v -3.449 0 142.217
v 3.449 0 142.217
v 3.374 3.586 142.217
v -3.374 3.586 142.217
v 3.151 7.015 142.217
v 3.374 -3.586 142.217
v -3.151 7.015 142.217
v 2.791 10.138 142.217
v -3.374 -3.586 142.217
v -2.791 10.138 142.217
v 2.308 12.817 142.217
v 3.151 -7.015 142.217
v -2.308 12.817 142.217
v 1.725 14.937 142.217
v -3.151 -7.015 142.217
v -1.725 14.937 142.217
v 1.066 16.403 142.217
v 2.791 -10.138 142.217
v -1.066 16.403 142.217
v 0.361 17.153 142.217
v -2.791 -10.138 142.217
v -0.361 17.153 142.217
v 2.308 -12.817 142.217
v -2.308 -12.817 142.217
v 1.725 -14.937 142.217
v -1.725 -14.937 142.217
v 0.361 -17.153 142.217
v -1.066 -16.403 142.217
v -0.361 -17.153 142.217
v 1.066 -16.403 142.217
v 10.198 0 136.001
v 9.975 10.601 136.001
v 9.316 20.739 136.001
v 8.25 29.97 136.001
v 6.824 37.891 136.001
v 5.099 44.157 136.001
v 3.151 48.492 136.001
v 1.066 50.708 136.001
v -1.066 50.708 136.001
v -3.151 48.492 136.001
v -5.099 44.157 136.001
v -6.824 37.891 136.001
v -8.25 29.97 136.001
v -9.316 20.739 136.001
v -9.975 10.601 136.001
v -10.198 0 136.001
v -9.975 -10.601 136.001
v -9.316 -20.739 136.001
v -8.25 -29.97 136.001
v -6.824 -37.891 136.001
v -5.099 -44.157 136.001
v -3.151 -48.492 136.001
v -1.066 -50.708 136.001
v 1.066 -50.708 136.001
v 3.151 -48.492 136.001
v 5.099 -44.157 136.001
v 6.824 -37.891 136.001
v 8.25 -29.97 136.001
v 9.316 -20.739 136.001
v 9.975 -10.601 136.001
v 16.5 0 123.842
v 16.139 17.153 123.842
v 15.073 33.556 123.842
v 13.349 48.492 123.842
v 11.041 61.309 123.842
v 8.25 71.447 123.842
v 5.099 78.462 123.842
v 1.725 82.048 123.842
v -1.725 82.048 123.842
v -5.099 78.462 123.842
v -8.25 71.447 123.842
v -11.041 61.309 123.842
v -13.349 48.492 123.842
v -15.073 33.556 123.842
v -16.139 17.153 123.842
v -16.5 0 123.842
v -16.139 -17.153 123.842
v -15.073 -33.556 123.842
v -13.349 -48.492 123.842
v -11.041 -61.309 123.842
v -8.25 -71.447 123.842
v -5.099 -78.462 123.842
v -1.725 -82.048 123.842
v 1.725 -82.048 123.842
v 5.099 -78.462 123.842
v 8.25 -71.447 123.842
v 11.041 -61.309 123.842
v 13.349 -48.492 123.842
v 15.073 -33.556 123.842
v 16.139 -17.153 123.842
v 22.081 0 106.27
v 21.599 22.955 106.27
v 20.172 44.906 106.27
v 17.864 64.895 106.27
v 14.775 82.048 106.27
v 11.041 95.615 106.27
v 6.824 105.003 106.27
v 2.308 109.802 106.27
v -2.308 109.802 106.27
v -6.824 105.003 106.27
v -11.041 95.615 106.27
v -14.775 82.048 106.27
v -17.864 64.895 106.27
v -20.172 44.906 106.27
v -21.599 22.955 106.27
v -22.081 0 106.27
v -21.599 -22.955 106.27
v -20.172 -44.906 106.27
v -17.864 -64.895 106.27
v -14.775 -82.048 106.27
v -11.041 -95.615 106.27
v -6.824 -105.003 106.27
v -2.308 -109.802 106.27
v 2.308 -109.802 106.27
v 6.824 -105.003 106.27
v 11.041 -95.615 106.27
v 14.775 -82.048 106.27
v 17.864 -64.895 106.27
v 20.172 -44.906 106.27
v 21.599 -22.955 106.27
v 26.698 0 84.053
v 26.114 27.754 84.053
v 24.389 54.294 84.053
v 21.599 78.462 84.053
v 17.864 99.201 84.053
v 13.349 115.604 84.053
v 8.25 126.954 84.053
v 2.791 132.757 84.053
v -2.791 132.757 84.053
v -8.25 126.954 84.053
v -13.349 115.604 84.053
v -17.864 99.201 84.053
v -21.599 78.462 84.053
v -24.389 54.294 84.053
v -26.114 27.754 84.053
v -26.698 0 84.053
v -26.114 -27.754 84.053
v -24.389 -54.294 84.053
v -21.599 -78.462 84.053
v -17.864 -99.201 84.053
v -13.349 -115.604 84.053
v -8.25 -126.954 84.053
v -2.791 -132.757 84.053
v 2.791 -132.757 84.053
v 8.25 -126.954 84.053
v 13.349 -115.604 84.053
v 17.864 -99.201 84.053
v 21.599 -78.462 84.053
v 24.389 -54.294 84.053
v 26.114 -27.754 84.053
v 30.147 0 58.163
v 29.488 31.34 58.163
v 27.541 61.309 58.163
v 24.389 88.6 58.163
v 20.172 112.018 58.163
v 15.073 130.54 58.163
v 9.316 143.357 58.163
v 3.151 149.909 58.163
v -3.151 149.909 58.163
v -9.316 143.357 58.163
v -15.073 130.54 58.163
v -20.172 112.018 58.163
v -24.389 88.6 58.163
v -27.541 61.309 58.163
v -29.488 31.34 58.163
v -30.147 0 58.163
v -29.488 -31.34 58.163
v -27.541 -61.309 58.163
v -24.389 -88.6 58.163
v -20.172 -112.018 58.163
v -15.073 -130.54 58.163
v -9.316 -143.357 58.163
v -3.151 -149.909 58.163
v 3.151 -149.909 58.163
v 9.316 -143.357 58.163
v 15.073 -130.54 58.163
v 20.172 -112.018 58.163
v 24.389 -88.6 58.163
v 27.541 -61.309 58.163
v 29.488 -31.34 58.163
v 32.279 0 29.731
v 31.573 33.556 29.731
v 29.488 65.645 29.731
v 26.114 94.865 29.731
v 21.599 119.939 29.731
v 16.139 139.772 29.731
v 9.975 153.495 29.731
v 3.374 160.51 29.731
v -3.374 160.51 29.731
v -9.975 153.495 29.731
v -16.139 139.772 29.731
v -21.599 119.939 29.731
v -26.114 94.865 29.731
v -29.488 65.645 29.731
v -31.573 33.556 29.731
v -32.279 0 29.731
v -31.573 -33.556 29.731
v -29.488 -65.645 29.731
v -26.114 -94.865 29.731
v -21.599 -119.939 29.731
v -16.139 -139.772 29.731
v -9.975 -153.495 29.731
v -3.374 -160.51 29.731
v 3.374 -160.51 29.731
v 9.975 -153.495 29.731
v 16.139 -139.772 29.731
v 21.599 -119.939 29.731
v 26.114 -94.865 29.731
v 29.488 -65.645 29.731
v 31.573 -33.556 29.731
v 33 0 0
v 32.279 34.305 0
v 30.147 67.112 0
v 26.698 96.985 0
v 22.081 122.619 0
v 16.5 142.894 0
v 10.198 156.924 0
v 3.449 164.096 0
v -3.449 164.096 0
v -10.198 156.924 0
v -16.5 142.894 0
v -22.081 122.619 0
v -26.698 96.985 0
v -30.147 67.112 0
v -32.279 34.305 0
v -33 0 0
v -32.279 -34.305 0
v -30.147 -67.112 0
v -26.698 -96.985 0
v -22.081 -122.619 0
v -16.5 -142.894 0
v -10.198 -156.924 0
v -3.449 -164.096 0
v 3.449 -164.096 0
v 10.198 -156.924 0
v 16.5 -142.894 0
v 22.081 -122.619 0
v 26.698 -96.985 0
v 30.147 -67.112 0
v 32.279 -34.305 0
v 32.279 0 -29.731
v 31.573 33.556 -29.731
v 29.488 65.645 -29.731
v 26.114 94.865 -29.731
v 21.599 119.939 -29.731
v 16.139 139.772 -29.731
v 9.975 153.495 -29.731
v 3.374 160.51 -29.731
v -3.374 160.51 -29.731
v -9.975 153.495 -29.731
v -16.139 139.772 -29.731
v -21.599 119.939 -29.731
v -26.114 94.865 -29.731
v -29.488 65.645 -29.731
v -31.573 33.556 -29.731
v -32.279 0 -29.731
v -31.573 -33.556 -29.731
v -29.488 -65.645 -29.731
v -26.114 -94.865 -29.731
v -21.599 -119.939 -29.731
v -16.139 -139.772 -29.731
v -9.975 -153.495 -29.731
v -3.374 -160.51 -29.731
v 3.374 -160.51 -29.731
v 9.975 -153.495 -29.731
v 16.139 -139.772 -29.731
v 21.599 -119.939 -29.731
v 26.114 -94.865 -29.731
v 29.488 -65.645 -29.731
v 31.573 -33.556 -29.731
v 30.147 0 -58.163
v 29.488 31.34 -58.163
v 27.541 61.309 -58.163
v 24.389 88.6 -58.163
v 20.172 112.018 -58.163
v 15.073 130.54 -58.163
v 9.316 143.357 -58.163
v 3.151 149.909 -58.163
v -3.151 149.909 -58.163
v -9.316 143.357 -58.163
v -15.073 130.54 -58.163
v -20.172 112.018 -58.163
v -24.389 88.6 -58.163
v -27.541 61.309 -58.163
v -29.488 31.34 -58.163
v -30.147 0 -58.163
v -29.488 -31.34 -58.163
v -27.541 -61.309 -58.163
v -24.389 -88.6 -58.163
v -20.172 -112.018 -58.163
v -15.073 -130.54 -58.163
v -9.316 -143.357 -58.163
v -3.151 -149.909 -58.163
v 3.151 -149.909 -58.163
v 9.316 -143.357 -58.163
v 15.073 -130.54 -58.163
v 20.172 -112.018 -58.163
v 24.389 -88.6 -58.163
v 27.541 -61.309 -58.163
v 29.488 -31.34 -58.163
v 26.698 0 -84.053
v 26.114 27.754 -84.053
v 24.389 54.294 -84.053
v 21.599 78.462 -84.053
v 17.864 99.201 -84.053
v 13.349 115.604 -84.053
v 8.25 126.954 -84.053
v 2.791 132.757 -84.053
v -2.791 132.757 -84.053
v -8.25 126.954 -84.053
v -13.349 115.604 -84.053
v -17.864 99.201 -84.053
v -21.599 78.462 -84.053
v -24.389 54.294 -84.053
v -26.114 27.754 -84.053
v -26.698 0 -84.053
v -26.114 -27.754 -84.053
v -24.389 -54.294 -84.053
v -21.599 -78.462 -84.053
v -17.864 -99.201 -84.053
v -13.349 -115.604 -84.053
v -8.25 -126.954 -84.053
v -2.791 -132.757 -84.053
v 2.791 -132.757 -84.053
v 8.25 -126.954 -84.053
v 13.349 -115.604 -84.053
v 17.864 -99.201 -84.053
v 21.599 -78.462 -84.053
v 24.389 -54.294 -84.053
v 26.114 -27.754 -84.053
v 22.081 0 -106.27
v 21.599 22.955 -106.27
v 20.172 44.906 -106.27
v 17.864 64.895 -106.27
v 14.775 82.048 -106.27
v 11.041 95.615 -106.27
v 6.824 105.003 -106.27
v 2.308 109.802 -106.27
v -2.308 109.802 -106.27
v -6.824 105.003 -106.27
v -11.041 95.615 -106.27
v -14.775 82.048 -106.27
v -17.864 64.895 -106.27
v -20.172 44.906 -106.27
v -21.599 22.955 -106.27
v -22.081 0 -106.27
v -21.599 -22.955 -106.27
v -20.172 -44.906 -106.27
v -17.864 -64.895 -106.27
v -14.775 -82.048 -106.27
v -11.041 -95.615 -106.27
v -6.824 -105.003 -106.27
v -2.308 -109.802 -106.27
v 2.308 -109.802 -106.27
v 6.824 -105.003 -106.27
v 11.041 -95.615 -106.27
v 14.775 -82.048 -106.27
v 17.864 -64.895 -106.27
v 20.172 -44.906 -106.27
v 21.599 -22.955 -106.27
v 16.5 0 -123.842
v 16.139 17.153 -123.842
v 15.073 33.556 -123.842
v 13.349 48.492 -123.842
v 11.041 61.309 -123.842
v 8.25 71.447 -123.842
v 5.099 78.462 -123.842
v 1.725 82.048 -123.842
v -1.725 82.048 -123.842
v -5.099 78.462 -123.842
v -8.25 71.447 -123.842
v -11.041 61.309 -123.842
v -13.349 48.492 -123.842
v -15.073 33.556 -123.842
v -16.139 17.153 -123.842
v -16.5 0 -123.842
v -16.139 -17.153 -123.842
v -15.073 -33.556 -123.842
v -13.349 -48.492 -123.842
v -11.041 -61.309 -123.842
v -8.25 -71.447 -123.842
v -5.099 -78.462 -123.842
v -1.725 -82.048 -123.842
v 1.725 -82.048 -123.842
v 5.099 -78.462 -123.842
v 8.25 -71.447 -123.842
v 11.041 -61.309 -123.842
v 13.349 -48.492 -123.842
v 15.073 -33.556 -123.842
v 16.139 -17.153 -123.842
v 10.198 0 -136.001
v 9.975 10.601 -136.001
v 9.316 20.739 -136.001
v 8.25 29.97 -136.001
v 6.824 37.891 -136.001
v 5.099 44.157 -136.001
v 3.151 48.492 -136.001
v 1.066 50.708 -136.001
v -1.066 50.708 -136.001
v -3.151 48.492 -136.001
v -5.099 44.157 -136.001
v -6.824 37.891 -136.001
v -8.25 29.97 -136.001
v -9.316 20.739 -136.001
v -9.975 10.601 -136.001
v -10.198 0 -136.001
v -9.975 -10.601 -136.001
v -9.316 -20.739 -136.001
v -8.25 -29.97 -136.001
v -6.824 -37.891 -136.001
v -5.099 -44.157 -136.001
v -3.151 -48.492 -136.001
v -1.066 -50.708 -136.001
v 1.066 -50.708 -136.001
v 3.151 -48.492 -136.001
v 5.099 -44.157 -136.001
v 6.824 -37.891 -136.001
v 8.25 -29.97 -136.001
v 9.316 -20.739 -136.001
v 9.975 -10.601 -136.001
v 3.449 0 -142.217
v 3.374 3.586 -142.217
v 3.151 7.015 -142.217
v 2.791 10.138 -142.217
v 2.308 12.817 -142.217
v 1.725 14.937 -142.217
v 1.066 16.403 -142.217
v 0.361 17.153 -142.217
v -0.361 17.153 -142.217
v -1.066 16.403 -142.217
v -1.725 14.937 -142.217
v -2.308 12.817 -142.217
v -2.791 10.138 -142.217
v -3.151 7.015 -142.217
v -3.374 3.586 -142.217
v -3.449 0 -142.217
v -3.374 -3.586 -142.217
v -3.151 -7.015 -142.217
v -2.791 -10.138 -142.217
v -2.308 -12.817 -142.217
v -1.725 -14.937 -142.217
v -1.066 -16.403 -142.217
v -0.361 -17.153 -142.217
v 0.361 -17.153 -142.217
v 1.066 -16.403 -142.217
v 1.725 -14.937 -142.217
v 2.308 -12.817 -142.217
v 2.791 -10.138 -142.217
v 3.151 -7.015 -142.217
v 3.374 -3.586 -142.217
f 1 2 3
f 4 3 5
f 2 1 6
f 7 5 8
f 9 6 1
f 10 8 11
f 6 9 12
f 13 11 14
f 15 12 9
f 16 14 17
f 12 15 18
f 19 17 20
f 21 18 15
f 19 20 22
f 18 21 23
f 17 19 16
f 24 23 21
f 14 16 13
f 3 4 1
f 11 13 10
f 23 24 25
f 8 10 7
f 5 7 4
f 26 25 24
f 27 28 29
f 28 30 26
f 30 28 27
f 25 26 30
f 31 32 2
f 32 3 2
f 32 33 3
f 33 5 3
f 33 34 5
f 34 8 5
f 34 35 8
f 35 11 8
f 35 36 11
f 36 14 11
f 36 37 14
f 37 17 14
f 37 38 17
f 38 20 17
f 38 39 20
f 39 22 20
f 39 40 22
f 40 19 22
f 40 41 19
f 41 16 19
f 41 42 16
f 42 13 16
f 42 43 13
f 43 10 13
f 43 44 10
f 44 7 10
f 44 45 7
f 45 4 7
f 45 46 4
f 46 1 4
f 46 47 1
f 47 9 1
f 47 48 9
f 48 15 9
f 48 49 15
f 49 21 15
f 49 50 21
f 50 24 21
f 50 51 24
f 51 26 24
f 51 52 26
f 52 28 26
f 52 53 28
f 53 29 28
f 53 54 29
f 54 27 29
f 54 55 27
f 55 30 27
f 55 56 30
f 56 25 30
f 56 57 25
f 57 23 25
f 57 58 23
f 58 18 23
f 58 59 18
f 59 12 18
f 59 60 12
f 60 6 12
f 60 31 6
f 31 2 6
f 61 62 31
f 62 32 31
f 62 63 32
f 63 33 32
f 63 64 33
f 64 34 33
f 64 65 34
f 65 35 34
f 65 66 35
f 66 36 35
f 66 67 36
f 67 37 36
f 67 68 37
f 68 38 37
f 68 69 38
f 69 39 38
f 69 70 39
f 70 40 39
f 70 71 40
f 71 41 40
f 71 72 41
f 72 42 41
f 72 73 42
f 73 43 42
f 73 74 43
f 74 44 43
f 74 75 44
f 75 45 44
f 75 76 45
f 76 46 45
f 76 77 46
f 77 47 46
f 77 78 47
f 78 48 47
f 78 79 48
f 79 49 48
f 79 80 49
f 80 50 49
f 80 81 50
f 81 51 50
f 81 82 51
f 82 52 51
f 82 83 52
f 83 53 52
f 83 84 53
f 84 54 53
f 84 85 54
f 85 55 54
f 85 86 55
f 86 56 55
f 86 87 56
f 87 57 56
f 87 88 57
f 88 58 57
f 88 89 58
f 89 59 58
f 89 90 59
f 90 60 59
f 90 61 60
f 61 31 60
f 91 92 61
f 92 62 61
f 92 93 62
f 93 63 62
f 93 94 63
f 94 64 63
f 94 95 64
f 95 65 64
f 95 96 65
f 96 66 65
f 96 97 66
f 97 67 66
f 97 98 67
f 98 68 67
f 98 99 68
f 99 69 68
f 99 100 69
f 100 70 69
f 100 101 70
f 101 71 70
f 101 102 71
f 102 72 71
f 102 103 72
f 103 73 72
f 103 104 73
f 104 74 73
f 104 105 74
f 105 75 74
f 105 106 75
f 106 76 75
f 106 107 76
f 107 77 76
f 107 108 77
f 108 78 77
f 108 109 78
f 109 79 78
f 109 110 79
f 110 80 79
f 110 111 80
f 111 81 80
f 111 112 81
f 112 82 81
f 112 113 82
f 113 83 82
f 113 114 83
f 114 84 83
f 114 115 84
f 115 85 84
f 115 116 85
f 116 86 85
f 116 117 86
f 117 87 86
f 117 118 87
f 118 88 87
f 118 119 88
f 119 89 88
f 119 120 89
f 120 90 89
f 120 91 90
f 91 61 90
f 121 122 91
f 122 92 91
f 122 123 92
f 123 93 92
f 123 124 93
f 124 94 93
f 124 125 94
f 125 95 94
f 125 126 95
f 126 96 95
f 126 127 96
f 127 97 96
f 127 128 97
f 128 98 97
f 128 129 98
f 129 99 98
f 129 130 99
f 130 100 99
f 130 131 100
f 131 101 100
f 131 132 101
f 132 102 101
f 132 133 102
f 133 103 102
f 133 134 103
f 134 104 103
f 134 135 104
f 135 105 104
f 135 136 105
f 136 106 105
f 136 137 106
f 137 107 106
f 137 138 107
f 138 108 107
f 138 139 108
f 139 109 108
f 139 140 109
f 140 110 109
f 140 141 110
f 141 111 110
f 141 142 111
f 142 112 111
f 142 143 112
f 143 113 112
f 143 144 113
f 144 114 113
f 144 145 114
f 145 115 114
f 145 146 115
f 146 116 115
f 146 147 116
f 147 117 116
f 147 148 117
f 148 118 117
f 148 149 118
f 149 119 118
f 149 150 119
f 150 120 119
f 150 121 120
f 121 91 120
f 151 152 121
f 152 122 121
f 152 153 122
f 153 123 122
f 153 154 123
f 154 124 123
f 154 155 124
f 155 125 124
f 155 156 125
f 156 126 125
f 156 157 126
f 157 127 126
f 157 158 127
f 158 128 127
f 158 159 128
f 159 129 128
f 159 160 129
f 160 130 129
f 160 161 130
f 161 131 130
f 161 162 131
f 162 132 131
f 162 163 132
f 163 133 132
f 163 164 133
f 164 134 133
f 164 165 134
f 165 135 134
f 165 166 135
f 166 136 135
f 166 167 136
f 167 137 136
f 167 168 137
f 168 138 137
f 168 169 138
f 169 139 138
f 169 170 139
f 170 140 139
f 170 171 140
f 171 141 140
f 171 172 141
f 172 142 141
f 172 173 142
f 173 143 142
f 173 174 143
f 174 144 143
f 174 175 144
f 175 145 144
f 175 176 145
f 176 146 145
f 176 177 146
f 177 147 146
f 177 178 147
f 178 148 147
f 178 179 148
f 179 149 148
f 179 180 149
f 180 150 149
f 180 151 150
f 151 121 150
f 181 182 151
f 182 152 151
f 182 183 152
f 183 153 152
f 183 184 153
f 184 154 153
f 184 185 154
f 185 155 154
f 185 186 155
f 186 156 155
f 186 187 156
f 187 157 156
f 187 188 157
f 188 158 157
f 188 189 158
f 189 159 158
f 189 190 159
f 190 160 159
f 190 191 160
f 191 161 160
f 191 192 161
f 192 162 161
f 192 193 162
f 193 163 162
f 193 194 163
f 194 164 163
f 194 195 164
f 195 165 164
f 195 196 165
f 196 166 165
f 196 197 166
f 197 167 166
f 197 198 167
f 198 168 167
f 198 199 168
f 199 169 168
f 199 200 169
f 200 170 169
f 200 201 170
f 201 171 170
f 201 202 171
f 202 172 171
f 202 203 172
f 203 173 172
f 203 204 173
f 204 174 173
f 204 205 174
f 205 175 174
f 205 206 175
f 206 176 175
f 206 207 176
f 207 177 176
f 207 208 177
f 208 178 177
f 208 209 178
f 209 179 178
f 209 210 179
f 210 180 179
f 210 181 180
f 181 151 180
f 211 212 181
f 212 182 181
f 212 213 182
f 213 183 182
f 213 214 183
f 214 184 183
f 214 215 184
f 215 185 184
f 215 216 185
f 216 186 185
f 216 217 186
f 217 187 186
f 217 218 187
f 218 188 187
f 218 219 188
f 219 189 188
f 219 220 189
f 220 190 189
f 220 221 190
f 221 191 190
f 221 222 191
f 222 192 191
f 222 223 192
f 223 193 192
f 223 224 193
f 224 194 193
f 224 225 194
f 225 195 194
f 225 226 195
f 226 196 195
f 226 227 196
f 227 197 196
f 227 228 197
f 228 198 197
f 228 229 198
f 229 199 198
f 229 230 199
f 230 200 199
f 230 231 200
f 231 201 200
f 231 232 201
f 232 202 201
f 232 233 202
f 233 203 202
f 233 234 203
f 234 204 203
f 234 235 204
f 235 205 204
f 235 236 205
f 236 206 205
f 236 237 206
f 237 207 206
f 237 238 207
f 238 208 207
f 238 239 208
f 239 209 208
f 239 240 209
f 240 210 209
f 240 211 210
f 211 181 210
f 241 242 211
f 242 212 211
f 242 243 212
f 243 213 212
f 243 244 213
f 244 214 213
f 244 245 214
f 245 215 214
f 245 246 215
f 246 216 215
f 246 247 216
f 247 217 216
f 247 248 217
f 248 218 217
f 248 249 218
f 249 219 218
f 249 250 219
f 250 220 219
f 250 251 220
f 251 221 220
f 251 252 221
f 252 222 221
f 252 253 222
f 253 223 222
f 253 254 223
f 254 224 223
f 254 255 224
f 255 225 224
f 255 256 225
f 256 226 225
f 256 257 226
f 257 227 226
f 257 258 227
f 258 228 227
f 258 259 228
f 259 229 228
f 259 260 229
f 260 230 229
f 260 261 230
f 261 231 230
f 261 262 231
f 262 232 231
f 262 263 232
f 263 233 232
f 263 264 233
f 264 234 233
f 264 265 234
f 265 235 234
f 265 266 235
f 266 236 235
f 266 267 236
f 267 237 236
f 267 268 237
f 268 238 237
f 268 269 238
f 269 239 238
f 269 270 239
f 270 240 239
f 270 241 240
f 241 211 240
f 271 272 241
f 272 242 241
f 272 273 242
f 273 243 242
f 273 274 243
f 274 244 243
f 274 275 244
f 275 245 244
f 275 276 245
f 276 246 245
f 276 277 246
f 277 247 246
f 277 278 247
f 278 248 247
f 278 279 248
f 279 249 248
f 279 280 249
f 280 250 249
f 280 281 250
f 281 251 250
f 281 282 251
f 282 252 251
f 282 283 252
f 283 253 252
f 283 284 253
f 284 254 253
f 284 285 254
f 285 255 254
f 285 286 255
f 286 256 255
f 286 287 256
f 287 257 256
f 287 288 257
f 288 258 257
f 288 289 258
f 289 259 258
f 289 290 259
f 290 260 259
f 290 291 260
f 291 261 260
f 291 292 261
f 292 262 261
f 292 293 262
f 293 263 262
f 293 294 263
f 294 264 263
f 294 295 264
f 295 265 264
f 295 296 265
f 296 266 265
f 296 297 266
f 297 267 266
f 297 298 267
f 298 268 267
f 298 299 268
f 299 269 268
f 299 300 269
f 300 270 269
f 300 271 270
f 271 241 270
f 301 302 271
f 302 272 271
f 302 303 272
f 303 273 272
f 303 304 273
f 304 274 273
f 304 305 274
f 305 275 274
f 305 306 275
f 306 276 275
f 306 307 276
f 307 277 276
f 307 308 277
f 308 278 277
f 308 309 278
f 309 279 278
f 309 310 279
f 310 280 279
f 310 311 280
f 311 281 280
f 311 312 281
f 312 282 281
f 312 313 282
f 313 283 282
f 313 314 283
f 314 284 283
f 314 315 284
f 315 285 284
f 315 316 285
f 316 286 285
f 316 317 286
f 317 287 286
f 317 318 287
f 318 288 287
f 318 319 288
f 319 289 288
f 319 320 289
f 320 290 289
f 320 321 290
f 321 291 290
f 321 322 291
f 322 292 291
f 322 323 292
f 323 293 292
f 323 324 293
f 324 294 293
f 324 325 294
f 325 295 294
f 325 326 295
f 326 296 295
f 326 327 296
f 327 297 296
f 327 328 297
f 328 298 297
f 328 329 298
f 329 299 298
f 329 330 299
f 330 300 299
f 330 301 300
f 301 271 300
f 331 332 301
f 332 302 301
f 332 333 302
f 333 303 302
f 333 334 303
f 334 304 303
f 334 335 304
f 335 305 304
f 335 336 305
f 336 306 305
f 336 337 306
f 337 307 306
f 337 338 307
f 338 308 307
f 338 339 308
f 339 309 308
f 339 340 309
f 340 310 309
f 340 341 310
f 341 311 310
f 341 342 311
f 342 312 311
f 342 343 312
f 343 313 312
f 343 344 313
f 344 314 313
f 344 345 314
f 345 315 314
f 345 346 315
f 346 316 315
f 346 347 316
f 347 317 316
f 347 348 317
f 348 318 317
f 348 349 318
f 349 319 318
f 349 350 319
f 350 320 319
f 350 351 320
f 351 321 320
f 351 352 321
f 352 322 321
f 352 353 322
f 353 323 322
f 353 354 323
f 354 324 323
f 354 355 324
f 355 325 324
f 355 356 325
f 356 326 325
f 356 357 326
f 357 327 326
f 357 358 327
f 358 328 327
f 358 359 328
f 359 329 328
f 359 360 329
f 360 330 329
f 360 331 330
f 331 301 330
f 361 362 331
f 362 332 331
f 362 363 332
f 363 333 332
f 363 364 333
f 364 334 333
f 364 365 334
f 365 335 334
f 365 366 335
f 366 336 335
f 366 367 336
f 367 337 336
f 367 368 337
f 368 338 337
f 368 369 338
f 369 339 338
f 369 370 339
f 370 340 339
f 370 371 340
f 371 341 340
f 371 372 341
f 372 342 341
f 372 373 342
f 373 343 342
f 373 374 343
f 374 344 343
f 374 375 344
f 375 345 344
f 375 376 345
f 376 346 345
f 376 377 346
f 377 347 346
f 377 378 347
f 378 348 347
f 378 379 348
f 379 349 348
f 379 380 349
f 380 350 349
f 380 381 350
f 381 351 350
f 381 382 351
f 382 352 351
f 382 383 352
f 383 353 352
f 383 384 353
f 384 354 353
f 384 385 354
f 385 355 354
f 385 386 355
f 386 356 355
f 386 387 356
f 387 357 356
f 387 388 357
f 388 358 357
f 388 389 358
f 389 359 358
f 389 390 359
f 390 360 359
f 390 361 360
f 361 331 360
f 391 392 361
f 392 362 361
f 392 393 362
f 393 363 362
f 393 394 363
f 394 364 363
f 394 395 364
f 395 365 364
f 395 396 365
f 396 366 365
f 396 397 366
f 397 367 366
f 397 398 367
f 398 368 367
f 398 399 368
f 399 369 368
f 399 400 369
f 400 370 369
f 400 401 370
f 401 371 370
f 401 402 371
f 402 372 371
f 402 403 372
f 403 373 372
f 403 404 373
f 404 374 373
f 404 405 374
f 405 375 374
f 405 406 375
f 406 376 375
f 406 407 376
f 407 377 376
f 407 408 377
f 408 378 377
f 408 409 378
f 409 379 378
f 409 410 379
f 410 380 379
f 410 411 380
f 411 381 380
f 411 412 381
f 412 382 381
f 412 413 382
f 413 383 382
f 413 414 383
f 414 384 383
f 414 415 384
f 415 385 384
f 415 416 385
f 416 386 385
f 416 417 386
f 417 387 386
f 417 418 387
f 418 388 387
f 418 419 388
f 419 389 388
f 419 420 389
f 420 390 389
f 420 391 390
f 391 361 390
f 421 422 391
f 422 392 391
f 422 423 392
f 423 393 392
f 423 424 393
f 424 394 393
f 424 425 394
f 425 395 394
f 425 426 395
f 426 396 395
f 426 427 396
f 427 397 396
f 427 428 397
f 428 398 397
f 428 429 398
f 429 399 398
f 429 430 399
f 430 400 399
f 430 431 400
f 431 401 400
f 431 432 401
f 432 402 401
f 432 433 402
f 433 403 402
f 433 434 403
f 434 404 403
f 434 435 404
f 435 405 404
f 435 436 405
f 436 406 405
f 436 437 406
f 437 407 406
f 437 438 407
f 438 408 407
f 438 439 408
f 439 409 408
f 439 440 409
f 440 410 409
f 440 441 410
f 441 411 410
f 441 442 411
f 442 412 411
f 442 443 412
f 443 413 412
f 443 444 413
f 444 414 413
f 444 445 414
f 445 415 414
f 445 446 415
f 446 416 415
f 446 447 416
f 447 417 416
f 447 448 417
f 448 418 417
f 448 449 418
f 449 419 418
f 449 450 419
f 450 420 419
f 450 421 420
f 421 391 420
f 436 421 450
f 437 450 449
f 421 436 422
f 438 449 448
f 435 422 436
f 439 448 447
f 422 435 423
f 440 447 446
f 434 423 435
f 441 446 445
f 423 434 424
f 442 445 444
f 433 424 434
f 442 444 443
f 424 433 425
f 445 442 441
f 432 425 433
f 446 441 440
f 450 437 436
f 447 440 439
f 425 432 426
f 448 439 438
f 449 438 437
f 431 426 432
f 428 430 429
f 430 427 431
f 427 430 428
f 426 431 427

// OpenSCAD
// Generated by SolidPython 1.0.1 on 2020-07-29 00:46:45


scale(v = [3, 15, 13]) {
	sphere(r = 11);
}
/***********************************************
*********      SolidPython code:      **********
************************************************
 
# import packages: SolidPython
from solid import *
from solid.utils import *
from itertools import chain, combinations, permutations


class Resize:

    def __init__(self, scad_file):
        self.scad_file = scad_file
        #self.scad_file = import_scad(scad_file)
        # cone/cylinder param:
        self.r1 = 0
        self.r2 = 0
        self.h = 0
        # rectangular prism param:
        self.w = 0
        self.l = 0
        # ellipse param:
        self.r = 0

    # import OpenScad code (file name corresponds to shape)


    # classify shape + parameters
    def assign(self, param1, param2, param3):
        if self.scad_file == 'cone.scad':
            self.r1 = param1
            self.r2 = param2
            self.h = param3
        elif self.scad_file == 'cylinder.scad':
            self.r1 = param1
            self.r2 = param2
            self.h = param3
        elif self.scad_file == 'rectangularPrism.scad':
            self.h = param1
            self.l = param2
            self.w = param3
        else:
            self.r = param1
            self.h = param2

    # resize parameters
    def iterate(self):
        x = range(3, 20, 2)
        i = 1
        if self.scad_file == 'cone.scad':
            tempList = list(permutations(x, 2))
            for temp in tempList:
                param1 = temp[0]
                param2 = temp[1]
                filepath = 'produced_scad_files/' + 'cone' + str(param1) + '_' + str(param2) + '_' + '.scad'
                scad_render_to_file(cylinder(h=param1, r1=param2, r2=0), filepath)

        elif self.scad_file == 'cylinder.scad':
            tempList = list(permutations(x, 3))
            for temp in tempList:
                param1 = temp[0]
                param2 = temp[1]
                filepath = 'produced_scad_files/' + 'cylinder' + str(param1) + '_' + str(param2) + '_' + '.scad'
                scad_render_to_file(cylinder(h=param1, r1=param2, r2=param2), filepath)

        elif self.scad_file == 'rectangularPrism.scad':
            tempList = list(permutations(x, 3))
            for temp in tempList:
                param1 = temp[0]
                param2 = temp[1]
                param3 = temp[2]
                filepath = 'produced_scad_files/' + 'rectangularPrism' + str(param1) + '_' + str(param2) + '_' + str(
                    param3) + '.scad'
                scad_render_to_file(cube(size=(param1, param2, param3)), filepath)

        elif self.scad_file == 'ellipse.scad':
            tempList = list(permutations(x, 4))
            for temp in tempList:
                param1 = temp[0]
                param2 = temp[1]
                param3 = temp[2]
                param4 = temp[3]
                filepath = 'produced_scad_files/' + 'ellipse' + str(param1) + '_' + str(param2) + '_' + str(param3) + '_' + str(param4) + '.scad'
                scad_render_to_file(scale([param1, param2, param3])(sphere(r=param4)), filepath)

    def render_to_scadfile(self):
        scad_render_to_file(scad, 'example.scad') 
 
************************************************/
